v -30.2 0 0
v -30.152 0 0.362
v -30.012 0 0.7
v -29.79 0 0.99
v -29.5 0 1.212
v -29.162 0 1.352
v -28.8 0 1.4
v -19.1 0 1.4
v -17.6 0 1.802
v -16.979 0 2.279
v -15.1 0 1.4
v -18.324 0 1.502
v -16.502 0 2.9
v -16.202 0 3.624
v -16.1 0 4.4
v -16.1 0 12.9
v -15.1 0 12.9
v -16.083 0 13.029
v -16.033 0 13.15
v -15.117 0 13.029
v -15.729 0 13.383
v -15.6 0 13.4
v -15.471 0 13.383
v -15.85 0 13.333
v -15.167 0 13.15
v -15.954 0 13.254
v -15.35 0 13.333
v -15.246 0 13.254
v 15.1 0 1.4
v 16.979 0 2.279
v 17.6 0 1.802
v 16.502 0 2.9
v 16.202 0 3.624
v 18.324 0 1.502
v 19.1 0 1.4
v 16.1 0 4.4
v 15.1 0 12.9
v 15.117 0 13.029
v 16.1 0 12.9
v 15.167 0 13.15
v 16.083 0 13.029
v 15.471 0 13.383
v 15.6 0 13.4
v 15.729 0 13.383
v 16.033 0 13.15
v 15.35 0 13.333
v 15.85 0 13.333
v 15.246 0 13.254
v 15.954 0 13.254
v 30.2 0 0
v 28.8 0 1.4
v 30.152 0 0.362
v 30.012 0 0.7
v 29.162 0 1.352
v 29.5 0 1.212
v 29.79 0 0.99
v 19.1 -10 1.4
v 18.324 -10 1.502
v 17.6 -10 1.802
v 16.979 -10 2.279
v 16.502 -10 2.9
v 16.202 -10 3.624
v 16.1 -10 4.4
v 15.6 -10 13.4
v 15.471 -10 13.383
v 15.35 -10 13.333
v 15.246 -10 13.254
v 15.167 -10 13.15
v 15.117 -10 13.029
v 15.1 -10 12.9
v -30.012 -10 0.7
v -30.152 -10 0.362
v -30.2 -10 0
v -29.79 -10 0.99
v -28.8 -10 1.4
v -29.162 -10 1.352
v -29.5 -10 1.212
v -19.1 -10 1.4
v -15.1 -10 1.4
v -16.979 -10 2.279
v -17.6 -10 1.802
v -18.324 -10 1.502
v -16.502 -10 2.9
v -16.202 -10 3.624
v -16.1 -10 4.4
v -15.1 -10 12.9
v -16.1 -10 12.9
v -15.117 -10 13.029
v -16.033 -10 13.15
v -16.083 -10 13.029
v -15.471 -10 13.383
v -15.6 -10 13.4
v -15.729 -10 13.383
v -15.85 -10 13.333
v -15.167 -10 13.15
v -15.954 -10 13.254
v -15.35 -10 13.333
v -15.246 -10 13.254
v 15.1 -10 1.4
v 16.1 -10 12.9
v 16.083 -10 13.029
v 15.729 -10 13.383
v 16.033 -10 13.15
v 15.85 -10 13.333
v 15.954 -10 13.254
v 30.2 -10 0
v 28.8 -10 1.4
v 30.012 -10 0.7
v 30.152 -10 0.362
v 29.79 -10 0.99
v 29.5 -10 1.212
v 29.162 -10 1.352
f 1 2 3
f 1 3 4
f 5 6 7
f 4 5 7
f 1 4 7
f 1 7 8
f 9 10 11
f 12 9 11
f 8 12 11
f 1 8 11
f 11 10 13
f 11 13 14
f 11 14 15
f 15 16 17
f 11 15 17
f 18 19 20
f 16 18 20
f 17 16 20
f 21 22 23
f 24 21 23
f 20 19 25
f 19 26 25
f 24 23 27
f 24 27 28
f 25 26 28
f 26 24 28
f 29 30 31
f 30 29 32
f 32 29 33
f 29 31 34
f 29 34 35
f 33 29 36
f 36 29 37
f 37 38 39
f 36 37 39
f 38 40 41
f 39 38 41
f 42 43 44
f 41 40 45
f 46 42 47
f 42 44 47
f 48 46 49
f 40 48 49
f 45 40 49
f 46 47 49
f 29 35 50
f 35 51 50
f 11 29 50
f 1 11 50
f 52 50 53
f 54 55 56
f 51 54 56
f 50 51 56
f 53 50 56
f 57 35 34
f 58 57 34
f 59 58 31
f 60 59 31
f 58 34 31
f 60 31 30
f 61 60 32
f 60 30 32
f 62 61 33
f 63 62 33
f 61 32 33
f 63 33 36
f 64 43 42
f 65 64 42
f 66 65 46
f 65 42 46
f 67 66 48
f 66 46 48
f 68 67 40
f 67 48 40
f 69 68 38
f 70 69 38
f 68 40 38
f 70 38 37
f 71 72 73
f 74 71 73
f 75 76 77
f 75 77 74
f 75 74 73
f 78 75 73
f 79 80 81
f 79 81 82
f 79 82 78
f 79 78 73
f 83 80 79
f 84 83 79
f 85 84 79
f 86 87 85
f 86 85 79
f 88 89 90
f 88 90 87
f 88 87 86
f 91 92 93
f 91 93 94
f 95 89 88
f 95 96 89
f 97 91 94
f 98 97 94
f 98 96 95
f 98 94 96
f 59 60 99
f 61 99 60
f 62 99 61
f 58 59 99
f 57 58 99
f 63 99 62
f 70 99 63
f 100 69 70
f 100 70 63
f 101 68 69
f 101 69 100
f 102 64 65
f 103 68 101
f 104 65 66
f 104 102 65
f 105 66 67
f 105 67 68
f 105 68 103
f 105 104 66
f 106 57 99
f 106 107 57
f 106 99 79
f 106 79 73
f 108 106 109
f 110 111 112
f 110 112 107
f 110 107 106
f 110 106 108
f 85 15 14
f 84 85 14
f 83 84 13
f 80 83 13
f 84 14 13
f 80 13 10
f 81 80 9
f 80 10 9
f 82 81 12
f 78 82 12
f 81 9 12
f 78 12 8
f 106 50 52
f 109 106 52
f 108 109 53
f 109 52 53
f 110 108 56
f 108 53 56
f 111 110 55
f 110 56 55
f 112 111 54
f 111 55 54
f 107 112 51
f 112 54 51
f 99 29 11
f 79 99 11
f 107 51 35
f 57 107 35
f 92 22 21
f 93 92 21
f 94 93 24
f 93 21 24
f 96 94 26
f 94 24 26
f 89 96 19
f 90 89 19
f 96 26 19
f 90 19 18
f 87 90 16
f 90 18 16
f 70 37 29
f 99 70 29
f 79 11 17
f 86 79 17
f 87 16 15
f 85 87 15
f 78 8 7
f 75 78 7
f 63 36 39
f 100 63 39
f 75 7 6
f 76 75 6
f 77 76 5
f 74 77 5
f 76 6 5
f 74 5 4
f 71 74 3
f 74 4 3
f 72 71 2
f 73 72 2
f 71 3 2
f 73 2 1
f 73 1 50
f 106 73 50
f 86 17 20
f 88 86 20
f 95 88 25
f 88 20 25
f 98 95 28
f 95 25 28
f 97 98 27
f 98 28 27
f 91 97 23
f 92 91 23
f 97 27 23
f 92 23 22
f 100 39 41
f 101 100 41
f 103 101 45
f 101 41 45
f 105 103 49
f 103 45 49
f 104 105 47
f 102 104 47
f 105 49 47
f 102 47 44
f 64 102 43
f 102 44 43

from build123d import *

# Parameters (mm, degrees)
F1_DEPTH = 10


with BuildPart() as f1:
    # F0 (on Front) → F1 (new body)
    with BuildSketch(Plane.XZ):
        with BuildLine():
            Line((-30.2, 0), (0, 0))
            Line((0, 0), (0, 1.4))
            Line((0, 1.4), (-15.1, 1.4))
            Line((-15.1, 1.4), (-15.1, 12.9))
            ThreePointArc((-15.1, 12.9), (-15.246447, 13.253553), (-15.6, 13.4))
            ThreePointArc((-15.6, 13.4), (-15.953553, 13.253553), (-16.1, 12.9))
            Line((-16.1, 12.9), (-16.1, 4.4))
            ThreePointArc((-16.1, 4.4), (-16.97868, 2.27868), (-19.1, 1.4))
            Line((-19.1, 1.4), (-28.8, 1.4))
            ThreePointArc((-28.8, 1.4), (-29.789949, 0.989949), (-30.2, 0))
        make_face()
        with BuildLine():
            Line((0, 1.4), (0, 0))
            Line((0, 0), (30.2, 0))
            ThreePointArc((30.2, 0), (29.789949, 0.989949), (28.8, 1.4))
            Line((28.8, 1.4), (19.1, 1.4))
            ThreePointArc((19.1, 1.4), (16.97868, 2.27868), (16.1, 4.4))
            Line((16.1, 4.4), (16.1, 12.9))
            ThreePointArc((16.1, 12.9), (15.953553, 13.253553), (15.6, 13.4))
            ThreePointArc((15.6, 13.4), (15.246447, 13.253553), (15.1, 12.9))
            Line((15.1, 12.9), (15.1, 1.4))
            Line((15.1, 1.4), (0, 1.4))
        make_face()
    extrude(amount=F1_DEPTH)


solid = f1.part
